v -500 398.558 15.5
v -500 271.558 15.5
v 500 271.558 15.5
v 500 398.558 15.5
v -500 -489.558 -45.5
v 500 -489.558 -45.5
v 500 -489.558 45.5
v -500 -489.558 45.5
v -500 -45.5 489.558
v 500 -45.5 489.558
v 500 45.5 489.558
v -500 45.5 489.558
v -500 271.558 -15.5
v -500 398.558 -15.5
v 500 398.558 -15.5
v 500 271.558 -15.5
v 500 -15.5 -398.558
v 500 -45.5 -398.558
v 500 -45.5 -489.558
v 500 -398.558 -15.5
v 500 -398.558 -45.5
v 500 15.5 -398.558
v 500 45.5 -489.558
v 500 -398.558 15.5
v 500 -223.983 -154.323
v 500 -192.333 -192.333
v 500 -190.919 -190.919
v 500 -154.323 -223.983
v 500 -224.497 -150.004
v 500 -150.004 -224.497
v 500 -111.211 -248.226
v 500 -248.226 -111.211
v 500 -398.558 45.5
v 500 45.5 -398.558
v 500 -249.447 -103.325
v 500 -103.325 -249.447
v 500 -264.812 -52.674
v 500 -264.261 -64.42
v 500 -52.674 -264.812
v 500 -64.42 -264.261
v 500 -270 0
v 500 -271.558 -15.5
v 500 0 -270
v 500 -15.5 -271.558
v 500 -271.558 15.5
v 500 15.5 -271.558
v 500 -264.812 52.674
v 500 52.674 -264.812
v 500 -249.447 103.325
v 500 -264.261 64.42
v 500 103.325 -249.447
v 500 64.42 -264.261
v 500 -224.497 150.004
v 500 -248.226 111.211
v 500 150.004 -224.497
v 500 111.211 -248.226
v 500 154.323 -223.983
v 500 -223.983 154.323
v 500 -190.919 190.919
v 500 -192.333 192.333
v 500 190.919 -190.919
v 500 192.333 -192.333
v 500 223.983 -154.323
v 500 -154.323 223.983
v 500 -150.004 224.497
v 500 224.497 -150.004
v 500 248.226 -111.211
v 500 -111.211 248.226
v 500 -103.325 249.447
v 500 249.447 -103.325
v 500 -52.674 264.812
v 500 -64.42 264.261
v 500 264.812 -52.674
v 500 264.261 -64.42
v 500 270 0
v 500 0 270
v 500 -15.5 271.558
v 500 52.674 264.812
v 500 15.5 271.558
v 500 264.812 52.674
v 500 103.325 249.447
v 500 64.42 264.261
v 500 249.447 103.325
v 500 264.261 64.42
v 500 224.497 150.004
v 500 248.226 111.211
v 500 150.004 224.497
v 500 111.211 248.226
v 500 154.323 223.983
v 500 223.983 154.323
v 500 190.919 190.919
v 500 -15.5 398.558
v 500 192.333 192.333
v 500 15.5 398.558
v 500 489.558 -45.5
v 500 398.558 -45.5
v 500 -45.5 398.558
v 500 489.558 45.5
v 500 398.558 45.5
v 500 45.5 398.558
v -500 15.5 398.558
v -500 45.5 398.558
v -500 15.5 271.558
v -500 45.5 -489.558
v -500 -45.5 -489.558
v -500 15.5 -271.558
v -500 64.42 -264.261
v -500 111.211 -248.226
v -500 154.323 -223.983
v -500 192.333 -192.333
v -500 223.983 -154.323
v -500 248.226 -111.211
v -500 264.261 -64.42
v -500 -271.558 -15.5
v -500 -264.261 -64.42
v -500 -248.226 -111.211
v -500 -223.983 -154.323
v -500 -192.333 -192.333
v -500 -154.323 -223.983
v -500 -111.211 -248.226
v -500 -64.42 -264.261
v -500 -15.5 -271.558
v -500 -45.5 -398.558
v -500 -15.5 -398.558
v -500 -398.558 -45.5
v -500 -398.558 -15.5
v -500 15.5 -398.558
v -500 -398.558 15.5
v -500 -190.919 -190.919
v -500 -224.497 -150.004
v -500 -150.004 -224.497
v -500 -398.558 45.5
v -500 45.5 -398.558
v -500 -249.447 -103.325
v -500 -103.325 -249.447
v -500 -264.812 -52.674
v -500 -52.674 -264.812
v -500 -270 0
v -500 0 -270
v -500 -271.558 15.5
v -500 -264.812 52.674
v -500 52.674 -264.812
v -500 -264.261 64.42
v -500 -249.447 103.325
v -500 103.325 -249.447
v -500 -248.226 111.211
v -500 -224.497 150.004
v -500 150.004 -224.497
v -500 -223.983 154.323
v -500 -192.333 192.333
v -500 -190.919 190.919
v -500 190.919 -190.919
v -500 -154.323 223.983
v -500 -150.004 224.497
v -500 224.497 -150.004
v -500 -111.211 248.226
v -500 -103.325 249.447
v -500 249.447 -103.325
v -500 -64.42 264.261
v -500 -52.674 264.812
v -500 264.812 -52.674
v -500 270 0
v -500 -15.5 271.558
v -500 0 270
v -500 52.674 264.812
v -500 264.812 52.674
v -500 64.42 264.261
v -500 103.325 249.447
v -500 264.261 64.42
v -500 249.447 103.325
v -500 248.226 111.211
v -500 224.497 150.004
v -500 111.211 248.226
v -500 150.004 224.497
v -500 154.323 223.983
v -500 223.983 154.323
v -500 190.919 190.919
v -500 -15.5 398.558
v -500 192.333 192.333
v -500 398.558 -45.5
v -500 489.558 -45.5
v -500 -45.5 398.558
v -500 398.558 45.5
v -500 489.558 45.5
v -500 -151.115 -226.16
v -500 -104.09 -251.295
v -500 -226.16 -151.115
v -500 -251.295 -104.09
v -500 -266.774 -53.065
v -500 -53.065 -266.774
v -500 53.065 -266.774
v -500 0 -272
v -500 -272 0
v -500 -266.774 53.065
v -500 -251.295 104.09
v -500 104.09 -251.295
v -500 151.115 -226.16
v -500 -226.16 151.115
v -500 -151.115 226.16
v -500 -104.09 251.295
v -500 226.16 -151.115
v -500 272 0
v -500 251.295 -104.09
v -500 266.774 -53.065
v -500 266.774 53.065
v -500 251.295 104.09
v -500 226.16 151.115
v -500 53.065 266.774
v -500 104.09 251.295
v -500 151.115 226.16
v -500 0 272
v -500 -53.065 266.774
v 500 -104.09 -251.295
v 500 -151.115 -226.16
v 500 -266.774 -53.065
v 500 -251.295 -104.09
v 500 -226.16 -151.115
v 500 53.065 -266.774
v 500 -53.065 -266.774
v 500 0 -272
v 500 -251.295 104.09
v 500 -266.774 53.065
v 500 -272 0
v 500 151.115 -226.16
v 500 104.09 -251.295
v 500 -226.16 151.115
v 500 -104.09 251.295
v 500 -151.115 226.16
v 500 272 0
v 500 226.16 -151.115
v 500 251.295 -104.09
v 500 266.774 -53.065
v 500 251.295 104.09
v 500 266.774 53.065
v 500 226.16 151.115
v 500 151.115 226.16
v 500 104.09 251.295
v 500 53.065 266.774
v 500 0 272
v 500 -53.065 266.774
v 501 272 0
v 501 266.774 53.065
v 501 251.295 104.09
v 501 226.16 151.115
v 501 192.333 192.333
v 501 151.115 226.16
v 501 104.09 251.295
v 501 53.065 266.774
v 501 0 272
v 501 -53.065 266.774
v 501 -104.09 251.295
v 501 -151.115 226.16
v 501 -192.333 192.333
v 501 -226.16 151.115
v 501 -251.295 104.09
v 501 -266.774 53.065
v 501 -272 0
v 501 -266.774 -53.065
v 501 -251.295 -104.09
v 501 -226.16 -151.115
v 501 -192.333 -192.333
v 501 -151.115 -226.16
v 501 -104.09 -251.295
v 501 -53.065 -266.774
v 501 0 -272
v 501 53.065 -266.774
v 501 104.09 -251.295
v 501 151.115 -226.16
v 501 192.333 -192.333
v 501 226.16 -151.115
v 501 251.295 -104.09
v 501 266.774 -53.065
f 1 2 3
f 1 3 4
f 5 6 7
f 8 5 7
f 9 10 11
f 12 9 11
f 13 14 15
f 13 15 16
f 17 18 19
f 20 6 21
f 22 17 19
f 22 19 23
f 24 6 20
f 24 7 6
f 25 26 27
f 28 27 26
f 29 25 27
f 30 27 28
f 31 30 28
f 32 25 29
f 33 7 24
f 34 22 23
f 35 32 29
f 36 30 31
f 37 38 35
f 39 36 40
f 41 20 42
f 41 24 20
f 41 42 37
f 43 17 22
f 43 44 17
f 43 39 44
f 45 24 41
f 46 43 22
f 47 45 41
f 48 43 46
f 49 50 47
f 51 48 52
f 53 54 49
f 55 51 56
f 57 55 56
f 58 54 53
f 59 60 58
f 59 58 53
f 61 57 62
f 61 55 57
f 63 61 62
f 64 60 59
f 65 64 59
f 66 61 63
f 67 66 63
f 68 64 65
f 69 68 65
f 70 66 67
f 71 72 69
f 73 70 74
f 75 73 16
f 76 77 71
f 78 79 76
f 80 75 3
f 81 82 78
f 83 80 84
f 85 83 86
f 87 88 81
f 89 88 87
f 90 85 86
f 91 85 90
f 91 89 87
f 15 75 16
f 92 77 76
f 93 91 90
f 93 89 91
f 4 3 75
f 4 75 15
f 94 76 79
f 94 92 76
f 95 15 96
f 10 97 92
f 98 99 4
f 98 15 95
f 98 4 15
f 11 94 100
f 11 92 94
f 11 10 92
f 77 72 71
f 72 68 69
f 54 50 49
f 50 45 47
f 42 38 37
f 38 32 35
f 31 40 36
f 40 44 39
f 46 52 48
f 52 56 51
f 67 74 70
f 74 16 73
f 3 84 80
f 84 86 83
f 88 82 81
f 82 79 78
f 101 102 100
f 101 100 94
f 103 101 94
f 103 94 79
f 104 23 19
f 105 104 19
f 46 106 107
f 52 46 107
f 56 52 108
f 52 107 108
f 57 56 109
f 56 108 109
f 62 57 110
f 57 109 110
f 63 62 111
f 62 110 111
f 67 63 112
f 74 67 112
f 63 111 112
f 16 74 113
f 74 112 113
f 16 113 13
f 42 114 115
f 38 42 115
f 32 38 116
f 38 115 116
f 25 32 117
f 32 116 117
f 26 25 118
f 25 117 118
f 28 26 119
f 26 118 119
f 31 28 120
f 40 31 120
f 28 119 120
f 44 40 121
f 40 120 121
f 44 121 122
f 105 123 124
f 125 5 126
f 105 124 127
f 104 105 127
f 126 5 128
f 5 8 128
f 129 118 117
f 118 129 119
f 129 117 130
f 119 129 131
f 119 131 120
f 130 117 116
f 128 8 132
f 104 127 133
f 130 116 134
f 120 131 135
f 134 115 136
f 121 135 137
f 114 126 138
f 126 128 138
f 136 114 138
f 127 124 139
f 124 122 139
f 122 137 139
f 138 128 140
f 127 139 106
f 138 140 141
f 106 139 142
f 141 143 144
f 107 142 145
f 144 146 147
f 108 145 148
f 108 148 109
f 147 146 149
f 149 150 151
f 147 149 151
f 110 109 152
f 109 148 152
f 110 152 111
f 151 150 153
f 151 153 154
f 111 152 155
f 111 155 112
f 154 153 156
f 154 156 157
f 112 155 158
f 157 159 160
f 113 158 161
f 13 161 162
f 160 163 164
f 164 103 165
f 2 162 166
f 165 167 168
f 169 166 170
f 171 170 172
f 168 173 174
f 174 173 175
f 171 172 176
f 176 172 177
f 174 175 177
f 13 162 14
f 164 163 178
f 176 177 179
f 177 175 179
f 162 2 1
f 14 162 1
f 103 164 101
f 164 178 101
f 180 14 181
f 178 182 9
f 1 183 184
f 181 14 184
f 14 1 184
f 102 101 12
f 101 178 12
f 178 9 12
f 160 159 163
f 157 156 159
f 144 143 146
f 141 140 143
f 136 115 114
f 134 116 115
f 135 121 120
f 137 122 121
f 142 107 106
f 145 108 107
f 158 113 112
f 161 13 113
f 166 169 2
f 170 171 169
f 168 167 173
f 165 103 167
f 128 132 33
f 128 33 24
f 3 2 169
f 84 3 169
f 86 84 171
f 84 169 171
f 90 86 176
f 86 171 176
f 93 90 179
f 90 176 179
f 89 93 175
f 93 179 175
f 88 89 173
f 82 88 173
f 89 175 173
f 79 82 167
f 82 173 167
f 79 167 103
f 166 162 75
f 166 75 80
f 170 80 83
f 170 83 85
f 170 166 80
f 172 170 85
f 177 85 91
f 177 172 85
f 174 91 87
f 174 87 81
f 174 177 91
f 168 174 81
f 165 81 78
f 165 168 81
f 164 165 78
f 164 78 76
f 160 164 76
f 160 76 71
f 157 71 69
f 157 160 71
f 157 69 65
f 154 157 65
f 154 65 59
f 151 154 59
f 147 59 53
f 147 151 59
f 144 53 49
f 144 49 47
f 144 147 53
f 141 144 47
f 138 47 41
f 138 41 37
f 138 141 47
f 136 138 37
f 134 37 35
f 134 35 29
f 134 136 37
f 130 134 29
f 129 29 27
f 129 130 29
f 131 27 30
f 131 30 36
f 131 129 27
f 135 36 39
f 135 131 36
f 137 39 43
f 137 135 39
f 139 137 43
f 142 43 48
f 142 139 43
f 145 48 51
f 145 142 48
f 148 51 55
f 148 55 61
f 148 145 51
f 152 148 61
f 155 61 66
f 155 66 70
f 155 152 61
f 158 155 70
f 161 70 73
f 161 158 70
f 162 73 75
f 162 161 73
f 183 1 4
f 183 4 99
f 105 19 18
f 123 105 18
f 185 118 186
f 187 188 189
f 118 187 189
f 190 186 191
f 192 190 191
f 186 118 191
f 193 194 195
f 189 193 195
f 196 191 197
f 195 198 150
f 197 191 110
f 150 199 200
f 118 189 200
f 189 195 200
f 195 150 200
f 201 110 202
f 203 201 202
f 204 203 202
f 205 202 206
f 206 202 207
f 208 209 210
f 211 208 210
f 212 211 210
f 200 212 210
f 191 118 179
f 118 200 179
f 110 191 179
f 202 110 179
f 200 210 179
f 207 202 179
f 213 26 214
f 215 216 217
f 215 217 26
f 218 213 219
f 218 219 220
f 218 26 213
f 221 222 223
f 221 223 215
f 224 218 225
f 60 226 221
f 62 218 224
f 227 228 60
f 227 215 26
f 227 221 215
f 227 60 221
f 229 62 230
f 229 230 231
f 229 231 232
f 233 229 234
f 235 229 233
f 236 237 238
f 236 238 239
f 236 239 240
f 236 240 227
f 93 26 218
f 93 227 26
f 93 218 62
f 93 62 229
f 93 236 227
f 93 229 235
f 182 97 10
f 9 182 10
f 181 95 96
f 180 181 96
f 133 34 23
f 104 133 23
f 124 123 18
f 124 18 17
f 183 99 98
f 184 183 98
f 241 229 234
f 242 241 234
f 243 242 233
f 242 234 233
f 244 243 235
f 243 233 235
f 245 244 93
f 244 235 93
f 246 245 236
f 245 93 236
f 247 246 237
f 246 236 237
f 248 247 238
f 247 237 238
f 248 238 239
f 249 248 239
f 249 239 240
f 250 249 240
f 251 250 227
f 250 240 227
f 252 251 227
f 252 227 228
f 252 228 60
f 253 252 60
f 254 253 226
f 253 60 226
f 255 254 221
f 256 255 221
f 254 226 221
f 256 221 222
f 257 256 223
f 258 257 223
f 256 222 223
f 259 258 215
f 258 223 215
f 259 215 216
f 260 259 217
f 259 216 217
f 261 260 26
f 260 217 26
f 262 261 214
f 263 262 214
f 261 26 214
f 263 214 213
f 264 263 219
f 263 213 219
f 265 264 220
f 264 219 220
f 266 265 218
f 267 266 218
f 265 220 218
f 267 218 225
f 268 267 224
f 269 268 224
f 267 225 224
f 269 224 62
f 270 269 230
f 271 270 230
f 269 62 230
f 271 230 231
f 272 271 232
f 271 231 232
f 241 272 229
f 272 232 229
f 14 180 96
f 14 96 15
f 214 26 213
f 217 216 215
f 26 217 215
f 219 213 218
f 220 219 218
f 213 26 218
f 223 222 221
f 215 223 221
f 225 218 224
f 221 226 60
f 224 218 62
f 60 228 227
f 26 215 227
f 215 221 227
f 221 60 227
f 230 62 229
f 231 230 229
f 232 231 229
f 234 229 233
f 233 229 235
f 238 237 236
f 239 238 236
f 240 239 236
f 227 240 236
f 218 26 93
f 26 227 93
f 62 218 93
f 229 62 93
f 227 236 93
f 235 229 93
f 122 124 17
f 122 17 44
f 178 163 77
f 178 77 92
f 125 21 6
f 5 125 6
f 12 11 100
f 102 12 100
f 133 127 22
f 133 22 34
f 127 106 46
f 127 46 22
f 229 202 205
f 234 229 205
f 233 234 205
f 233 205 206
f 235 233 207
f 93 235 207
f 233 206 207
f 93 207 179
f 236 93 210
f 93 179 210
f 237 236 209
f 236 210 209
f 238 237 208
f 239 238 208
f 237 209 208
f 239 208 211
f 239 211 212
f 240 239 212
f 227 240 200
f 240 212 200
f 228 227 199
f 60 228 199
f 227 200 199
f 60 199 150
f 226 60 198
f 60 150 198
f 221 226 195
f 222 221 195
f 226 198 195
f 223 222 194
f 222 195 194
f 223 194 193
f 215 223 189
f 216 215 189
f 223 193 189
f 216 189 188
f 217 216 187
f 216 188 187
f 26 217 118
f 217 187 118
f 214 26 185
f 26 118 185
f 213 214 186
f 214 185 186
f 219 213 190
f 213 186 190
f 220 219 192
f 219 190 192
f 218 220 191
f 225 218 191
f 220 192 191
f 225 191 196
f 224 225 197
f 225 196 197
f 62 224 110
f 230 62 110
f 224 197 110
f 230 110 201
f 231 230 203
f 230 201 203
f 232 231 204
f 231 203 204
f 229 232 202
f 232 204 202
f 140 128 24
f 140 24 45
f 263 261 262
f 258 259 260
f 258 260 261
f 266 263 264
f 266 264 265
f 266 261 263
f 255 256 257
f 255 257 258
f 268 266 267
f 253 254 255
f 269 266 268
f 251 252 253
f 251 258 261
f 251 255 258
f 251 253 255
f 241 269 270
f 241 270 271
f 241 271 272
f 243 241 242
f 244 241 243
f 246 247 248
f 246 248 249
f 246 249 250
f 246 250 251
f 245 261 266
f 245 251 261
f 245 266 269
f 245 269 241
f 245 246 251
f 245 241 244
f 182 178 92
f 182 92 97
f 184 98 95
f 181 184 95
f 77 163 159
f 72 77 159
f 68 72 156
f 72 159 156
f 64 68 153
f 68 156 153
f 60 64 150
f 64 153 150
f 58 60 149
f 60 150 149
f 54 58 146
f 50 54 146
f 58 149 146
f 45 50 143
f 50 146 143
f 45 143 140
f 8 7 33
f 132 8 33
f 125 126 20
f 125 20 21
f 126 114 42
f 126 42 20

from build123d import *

# Parameters (mm, degrees)
SKETCH001_R  = 272
PAD_DEPTH    = 1000
SKETCH002_R  = 272
PAD001_DEPTH = 1
SKETCH_R     = 270
PAD002_DEPTH = 1000


with BuildPart() as pad:
    # Sketch001 → Pad (new body)
    with BuildSketch(Plane.YZ.offset(-500)):
        Circle(SKETCH001_R)
    extrude(amount=PAD_DEPTH)


with BuildPart() as rotor_face02:
    # Sketch002 → Pad001 (new body)
    with BuildSketch(Plane.YZ.offset(500)):
        Circle(SKETCH002_R)
    extrude(amount=PAD001_DEPTH)


with BuildPart() as rotot_with_hammer:
    # Sketch → Pad002 (new body)
    with BuildSketch(Plane.YZ.offset(-500)):
        with BuildLine():
            ThreePointArc((-15.5, 271.558005), (-192.333044, 192.333044), (-271.558005, 15.5))
            Line((-398.558005, 15.5), (-271.558005, 15.5))
            Line((-398.558005, 45.5), (-398.558005, 15.5))
            Line((-489.558005, 45.5), (-398.558005, 45.5))
            Line((-489.558005, -45.5), (-489.558005, 45.5))
            Line((-398.558005, -45.5), (-489.558005, -45.5))
            Line((-398.558005, -15.5), (-398.558005, -45.5))
            Line((-271.558005, -15.5), (-398.558005, -15.5))
            ThreePointArc((-271.558005, -15.5), (-192.333044, -192.333044), (-15.5, -271.558005))
            Line((-15.5, -398.558005), (-15.5, -271.558005))
            Line((-45.5, -398.558005), (-15.5, -398.558005))
            Line((-45.5, -489.558005), (-45.5, -398.558005))
            Line((45.5, -489.558005), (-45.5, -489.558005))
            Line((45.5, -398.558005), (45.5, -489.558005))
            Line((15.5, -398.558005), (45.5, -398.558005))
            Line((15.5, -271.558005), (15.5, -398.558005))
            ThreePointArc((15.5, -271.558005), (192.333044, -192.333044), (271.558005, -15.5))
            Line((398.558005, -15.5), (271.558005, -15.5))
            Line((398.558005, -45.5), (398.558005, -15.5))
            Line((489.558005, -45.5), (398.558005, -45.5))
            Line((489.558005, 45.5), (489.558005, -45.5))
            Line((398.558005, 45.5), (489.558005, 45.5))
            Line((398.558005, 15.5), (398.558005, 45.5))
            Line((271.558005, 15.5), (398.558005, 15.5))
            ThreePointArc((271.558005, 15.5), (192.333044, 192.333044), (15.5, 271.558005))
            Line((15.5, 398.558005), (15.5, 271.558005))
            Line((45.5, 398.558005), (15.5, 398.558005))
            Line((45.5, 489.558005), (45.5, 398.558005))
            Line((-45.5, 489.558005), (45.5, 489.558005))
            Line((-45.5, 398.558005), (-45.5, 489.558005))
            Line((-15.5, 398.558005), (-45.5, 398.558005))
            Line((-15.5, 271.558005), (-15.5, 398.558005))
        make_face()
        Circle(SKETCH_R, mode=Mode.SUBTRACT)
    extrude(amount=PAD002_DEPTH)


solid = Compound([pad.part, rotor_face02.part, rotot_with_hammer.part])
